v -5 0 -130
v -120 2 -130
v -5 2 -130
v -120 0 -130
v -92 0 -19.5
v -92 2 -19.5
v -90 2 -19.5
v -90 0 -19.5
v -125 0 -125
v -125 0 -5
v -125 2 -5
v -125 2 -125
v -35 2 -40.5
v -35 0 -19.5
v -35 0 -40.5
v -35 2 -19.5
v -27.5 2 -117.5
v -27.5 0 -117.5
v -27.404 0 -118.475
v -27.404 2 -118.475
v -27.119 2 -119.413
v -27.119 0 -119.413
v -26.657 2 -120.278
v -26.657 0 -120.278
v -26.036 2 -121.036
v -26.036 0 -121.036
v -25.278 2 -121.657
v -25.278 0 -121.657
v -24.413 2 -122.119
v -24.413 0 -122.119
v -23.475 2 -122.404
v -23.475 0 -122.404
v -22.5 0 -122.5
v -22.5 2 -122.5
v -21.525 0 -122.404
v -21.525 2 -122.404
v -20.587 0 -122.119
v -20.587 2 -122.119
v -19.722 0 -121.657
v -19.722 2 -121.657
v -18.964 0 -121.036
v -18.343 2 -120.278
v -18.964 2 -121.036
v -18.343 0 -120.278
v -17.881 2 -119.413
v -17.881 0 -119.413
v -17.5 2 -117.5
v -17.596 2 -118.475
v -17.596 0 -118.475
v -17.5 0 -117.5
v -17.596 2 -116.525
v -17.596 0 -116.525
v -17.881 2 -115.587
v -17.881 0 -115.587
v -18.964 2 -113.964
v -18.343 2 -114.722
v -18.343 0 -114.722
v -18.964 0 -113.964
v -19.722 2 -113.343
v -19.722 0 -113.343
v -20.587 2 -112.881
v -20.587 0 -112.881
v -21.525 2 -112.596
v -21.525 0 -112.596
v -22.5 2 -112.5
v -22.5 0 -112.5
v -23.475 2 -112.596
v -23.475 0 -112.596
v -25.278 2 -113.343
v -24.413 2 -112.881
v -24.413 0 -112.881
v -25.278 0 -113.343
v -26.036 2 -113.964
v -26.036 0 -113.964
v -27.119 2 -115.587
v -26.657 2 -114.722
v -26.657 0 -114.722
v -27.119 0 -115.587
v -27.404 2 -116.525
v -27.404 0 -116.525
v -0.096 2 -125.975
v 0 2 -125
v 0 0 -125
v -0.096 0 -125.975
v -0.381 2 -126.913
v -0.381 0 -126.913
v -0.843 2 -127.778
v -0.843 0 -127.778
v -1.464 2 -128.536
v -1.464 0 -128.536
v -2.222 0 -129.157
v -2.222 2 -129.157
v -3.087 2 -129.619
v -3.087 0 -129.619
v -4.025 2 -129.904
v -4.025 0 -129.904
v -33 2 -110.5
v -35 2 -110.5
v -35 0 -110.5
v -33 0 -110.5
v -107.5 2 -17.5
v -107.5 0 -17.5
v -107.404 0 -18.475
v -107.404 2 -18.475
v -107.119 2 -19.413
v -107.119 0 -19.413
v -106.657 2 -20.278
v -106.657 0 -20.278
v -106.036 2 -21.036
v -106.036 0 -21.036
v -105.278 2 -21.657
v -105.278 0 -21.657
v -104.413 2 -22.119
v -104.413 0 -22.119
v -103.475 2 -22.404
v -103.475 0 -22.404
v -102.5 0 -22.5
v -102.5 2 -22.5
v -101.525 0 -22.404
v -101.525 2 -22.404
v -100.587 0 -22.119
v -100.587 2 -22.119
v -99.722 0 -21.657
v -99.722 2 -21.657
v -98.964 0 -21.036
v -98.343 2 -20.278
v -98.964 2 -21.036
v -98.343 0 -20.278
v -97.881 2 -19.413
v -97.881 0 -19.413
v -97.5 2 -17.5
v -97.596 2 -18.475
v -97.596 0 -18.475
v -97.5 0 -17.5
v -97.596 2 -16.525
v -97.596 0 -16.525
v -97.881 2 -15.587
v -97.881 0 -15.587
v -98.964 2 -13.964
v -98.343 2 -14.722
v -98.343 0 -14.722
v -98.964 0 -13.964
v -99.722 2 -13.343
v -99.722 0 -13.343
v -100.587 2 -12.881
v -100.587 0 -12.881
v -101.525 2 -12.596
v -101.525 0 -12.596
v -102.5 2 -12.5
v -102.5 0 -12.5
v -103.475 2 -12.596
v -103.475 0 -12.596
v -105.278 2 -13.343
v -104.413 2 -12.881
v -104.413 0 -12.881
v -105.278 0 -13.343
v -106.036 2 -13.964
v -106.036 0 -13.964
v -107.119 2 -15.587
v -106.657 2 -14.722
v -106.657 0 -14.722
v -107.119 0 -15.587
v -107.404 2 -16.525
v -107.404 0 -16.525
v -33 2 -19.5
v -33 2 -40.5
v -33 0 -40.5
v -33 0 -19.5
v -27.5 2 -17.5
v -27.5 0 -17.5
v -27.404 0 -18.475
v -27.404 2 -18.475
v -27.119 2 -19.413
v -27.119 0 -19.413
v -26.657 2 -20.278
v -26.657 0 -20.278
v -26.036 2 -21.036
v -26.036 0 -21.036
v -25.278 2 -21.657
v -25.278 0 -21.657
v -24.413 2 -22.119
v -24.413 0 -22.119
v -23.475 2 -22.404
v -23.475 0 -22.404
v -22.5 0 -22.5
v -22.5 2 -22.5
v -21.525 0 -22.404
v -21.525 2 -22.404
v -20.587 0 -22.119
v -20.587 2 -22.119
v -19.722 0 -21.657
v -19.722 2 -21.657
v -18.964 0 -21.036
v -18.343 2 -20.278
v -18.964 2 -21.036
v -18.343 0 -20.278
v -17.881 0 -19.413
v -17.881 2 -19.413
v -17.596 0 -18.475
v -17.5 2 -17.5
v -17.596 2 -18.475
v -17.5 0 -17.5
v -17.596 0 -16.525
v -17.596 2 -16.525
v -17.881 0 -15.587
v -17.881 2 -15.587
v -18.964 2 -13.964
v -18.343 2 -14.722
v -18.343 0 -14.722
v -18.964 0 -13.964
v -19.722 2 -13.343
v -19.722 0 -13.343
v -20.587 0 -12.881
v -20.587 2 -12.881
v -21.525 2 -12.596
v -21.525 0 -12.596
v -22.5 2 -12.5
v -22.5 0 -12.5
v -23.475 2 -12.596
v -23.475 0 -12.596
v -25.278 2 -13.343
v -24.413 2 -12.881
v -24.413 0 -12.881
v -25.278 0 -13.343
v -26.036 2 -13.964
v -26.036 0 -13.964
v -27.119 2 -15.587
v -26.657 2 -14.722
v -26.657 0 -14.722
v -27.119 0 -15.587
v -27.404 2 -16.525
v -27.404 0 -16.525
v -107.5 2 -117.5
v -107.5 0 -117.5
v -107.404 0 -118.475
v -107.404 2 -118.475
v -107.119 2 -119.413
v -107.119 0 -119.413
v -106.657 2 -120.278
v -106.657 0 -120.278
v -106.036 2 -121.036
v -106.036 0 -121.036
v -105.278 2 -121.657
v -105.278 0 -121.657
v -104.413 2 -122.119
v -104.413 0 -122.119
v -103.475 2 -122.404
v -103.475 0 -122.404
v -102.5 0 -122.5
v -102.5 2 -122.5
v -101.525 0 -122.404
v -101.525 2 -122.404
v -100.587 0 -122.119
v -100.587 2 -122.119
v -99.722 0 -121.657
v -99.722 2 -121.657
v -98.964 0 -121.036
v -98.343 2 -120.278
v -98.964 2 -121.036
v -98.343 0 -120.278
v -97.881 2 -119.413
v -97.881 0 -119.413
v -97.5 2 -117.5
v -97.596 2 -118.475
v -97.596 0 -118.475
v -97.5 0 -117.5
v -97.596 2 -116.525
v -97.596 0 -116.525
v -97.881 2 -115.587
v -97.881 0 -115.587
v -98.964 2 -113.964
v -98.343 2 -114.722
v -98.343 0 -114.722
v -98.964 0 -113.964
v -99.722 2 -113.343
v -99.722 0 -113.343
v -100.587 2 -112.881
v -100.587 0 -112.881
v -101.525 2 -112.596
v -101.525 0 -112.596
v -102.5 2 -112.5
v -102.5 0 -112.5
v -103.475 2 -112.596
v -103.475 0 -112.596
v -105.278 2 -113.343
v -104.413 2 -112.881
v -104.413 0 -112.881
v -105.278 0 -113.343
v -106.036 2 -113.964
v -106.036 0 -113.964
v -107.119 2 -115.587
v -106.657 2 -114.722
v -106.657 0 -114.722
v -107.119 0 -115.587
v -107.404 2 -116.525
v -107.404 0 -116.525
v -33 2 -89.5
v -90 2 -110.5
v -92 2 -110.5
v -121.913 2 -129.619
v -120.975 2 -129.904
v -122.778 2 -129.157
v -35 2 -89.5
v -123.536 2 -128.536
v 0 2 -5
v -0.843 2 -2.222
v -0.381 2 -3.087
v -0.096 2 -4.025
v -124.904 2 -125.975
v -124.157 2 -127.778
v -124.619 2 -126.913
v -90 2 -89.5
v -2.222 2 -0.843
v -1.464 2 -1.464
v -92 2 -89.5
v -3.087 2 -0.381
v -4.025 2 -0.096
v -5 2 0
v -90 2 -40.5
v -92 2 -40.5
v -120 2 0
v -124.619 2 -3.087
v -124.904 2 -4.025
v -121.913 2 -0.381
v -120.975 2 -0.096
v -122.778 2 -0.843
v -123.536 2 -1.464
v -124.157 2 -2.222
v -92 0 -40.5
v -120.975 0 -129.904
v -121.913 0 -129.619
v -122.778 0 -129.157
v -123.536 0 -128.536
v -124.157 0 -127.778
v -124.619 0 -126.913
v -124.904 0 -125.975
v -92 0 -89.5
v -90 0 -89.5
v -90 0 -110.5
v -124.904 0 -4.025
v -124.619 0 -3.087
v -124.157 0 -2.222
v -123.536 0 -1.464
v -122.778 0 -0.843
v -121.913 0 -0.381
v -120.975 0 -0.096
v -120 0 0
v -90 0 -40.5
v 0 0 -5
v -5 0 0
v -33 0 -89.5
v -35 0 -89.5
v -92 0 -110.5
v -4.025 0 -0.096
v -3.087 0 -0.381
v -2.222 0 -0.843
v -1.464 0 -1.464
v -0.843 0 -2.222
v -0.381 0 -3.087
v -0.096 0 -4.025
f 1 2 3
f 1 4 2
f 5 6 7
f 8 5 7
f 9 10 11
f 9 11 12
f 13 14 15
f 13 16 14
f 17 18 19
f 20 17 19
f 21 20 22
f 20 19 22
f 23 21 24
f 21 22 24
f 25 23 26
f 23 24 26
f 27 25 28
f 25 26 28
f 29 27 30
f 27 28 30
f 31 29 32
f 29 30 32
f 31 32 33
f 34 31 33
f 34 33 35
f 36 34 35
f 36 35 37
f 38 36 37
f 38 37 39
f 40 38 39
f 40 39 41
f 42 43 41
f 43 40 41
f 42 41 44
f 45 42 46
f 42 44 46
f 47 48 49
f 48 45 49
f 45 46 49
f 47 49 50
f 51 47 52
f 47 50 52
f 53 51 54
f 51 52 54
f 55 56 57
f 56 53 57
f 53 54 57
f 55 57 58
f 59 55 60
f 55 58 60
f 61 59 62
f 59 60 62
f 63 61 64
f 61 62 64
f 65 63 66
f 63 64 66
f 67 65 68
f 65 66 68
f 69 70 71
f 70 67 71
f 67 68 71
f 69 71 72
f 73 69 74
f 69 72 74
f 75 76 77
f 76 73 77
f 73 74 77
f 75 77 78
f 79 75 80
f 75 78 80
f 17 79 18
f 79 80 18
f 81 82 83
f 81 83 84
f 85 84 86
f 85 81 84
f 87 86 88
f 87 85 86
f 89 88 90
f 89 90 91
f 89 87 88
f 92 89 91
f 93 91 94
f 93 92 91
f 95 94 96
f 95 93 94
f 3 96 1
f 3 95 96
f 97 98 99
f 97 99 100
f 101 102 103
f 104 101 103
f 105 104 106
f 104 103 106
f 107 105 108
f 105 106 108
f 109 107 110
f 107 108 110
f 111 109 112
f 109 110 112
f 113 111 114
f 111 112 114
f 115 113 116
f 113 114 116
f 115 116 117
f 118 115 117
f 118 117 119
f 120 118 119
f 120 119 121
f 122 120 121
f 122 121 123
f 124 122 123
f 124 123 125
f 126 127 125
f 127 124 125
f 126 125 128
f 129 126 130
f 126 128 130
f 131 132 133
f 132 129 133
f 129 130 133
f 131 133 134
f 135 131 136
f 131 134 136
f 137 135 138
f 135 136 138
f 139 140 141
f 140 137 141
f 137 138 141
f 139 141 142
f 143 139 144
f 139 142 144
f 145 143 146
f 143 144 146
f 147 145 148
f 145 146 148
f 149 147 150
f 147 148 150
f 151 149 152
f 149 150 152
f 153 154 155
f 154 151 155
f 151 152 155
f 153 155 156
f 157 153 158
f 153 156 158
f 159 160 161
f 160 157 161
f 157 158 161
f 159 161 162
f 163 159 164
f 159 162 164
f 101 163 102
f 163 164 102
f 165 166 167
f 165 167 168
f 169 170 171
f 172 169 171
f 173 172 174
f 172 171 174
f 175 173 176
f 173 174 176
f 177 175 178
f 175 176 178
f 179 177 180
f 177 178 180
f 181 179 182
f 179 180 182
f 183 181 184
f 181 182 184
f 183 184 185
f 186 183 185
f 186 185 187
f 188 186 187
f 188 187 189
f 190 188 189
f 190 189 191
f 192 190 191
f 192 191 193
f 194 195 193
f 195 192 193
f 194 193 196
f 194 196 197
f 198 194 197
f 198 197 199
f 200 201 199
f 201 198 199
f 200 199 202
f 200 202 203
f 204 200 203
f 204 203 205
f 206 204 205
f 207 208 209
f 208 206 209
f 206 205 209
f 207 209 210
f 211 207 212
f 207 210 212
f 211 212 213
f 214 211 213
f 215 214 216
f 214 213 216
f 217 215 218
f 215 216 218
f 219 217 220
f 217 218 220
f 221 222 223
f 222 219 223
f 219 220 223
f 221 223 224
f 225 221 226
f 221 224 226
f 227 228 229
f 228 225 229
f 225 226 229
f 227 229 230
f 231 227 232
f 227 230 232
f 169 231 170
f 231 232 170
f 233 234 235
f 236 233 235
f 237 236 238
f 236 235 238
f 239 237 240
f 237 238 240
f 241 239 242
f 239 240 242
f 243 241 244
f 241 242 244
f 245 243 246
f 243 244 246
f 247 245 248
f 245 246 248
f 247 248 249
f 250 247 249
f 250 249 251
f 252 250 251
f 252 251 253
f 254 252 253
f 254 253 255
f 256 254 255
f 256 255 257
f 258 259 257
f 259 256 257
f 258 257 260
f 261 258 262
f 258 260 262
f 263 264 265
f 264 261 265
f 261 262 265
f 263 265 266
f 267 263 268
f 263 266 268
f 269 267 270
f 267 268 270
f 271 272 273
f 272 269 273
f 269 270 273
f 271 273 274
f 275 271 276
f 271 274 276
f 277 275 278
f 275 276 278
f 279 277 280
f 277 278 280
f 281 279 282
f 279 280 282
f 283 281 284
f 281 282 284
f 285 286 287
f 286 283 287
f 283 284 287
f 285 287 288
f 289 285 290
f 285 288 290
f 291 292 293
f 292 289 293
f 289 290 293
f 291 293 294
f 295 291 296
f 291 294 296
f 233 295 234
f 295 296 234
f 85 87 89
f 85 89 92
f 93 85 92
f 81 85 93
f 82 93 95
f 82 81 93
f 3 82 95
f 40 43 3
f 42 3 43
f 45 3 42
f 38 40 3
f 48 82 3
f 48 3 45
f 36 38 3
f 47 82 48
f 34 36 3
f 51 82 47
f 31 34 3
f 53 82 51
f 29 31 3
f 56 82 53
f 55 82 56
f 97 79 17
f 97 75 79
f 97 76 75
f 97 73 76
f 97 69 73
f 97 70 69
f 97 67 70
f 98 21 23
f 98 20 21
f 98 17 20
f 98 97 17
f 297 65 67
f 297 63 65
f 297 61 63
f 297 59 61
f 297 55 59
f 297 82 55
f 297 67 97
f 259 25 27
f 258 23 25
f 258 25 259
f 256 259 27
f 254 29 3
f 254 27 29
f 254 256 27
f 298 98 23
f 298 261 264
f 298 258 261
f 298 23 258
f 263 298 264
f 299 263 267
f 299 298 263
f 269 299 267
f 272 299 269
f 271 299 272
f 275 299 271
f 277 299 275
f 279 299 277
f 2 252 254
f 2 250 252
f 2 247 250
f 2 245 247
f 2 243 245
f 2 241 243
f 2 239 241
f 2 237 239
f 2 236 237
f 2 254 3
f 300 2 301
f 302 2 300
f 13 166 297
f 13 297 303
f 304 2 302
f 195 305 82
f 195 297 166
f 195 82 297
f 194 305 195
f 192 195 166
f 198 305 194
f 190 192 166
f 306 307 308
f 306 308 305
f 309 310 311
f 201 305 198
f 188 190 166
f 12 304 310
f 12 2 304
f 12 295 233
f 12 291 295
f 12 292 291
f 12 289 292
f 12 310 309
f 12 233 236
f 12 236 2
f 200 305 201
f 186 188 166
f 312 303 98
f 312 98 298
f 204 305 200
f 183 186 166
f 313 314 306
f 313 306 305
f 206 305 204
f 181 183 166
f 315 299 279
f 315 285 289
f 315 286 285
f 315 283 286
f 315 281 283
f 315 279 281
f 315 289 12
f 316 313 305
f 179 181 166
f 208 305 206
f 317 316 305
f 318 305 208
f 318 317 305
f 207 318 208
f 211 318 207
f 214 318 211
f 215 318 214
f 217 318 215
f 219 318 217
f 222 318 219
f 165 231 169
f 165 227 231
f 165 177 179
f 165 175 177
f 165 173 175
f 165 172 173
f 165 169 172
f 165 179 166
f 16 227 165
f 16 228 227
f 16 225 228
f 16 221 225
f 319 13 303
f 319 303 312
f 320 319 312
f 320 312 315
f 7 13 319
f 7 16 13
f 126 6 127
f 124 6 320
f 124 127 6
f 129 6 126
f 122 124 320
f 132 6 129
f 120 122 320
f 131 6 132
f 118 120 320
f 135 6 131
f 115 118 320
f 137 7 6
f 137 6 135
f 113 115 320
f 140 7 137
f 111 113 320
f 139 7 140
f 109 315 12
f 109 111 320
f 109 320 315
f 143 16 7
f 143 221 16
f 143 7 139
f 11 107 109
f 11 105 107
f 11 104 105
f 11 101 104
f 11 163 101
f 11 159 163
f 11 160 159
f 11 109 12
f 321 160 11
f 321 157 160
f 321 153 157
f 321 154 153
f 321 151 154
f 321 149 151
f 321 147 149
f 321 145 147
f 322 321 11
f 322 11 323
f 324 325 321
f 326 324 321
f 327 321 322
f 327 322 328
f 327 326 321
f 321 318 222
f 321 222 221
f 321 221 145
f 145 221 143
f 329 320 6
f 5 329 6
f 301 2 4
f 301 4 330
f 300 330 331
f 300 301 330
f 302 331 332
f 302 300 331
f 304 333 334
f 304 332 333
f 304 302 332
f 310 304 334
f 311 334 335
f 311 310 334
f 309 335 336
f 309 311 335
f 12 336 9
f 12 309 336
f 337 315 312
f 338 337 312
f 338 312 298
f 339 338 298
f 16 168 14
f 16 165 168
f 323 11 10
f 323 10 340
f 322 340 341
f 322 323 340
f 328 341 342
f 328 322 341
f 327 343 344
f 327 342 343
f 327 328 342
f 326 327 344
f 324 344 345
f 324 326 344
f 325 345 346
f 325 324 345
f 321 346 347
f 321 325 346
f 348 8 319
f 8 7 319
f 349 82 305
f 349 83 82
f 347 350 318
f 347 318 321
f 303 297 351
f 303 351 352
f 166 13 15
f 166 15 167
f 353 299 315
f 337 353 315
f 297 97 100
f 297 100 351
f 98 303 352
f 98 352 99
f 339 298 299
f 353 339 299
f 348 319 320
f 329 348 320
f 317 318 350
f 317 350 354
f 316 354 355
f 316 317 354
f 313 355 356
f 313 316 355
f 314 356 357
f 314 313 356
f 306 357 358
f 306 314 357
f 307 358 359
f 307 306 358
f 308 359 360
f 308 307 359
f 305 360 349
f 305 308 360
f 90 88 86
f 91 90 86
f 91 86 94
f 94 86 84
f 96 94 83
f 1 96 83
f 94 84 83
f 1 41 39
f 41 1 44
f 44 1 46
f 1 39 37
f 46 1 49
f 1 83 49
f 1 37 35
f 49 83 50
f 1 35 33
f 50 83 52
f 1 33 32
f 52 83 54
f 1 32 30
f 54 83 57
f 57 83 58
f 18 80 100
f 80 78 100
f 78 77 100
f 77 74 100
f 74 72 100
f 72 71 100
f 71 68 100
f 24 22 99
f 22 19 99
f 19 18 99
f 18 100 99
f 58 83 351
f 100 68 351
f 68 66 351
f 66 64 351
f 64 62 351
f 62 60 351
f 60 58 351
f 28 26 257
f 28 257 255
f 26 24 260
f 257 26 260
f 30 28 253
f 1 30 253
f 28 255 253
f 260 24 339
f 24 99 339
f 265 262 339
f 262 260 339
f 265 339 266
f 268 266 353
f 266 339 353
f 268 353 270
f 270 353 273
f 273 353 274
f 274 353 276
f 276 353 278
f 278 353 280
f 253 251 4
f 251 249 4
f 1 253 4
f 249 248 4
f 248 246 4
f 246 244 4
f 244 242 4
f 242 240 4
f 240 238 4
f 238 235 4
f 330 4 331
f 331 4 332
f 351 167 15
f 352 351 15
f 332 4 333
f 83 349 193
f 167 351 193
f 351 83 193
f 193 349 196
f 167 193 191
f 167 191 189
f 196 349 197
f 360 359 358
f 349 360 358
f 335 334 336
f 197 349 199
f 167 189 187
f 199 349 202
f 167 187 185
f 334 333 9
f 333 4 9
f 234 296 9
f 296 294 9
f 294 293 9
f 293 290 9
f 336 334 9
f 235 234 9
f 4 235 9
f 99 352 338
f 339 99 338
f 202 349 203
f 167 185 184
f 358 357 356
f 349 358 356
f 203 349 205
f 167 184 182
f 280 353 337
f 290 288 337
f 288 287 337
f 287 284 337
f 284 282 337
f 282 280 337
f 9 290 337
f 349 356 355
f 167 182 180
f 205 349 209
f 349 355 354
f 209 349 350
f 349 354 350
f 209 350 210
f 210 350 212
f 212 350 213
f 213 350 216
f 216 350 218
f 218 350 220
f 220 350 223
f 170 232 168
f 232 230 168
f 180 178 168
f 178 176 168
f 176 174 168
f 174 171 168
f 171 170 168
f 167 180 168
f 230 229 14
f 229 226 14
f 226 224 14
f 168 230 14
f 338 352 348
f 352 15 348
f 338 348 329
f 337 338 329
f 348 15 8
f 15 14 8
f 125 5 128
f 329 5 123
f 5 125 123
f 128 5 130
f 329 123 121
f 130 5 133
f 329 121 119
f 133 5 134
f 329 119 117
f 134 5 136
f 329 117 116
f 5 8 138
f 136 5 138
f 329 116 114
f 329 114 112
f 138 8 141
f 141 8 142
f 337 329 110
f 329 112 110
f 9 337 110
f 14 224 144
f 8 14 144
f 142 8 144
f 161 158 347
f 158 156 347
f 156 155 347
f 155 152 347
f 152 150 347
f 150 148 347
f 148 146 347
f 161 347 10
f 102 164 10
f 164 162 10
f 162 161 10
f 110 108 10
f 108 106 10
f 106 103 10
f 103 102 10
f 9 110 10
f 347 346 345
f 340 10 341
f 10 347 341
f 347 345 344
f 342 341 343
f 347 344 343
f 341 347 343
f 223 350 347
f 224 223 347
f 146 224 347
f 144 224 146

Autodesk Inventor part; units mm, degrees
ref_plane "YZ Plane" through (0, 0, 0) normal (1, 0, 0) x (0, 1, 0)
ref_plane "XZ Plane" through (0, 0, 0) normal (0, 1, 0) x (-1, 0, 0)
ref_plane "XY Plane" through (0, 0, 0) normal (0, 0, 1) x (1, 0, 0)
sketch "Sketch1" plane through (0, 0, 0) normal (0, 1, 0) x (-1, 0, 0)
  line L0 (0, 0) -> (125, 0)
  line L1 (125, 0) -> (125, -130)
  line L2 (125, -130) -> (0, -130)
  line L3 (0, -130) -> (0, 0)
  circle A0 centre (102.5, -17.5) radius 5
  circle A1 centre (102.5, -117.5) radius 5
  circle A2 centre (22.5, -17.5) radius 5
  circle A3 centre (22.5, -117.5) radius 5
  dimension "d0" = 130
  dimension "d1" = 125
  dimension "d2" = 10
  dimension "d3" = 10
  dimension "d4" = 100
  dimension "d5" = 10
  dimension "d6" = 10
  dimension "d7" = 100
  dimension "d8" = 80
  dimension "d9" = 80
  dimension "d10" = 17.5
  dimension "d11" = 22.5
  dimension "d12" = 17.5
  dimension "d13" = 22.5
extrude "Extrusion1" add sketch "Sketch1" along normal blind 2
sketch "Sketch2" plane through (0, 2, 0) normal (0, 1, 0) x (1, 0, 0)
  line L0 (-90, 115.6784) -> (-35, 115.6784) construction
  line L1 (-35, 115.6784) -> (-35, 15.6784) construction
  line L2 (-35, 15.6784) -> (-90, 15.6784) construction
  line L3 (-90, 15.6784) -> (-90, 115.6784) construction
  line L4 (0, 130) -> (-125, 130) projected
  line L5 (-125, 130) -> (-125, 0) projected
  line L6 (-125, 0) -> (0, 0) projected
  line L7 (0, 0) -> (0, 130) projected
  circle A0 centre (-22.5, 117.5) radius 5 projected
  circle A1 centre (-22.5, 17.5) radius 5 projected
  circle A2 centre (-102.5, 117.5) radius 5 projected
  circle A3 centre (-102.5, 17.5) radius 5 projected
  line L8 (-35, 40.5) -> (-33, 40.5)
  line L9 (-33, 40.5) -> (-33, 19.5)
  line L10 (-33, 19.5) -> (-35, 19.5)
  line L11 (-35, 19.5) -> (-35, 40.5)
  line L12 (-35, 110.5) -> (-33, 110.5)
  line L13 (-33, 110.5) -> (-33, 89.5)
  line L14 (-33, 89.5) -> (-35, 89.5)
  line L15 (-35, 89.5) -> (-35, 110.5)
  line L16 (-90, 110.5) -> (-92, 110.5)
  line L17 (-92, 110.5) -> (-92, 89.5)
  line L18 (-92, 89.5) -> (-90, 89.5)
  line L19 (-90, 89.5) -> (-90, 110.5)
  line L20 (-90, 40.5) -> (-92, 40.5)
  line L21 (-92, 40.5) -> (-92, 19.5)
  line L22 (-92, 19.5) -> (-90, 19.5)
  line L23 (-90, 19.5) -> (-90, 40.5)
  dimension "d16" = 55
  dimension "d17" = 100
  dimension "d18" = 125
  dimension "d19" = 35
  dimension "d20" = 2
  dimension "d21" = 2
  dimension "d22" = 2
  dimension "d23" = 2
  dimension "d24" = 21
  dimension "d25" = 21
  dimension "d26" = 21
  dimension "d27" = 21
  dimension "d28" = 19.5
  dimension "d29" = 19.5
  dimension "d30" = 19.5
  dimension "d31" = 19.5
extrude "Extrusion2" cut sketch "Sketch2" against normal through all contours L8 L9 L10 L11 | L12 L13 L14 L15 | L19 L18 L17 L16 | L23 L22 L21 L20
fillet "Fillet1" radius 5 4 edges at (0, 1, 0) (0, 1, -130) (-125, 1, 0) (-125, 1, -130)
equation "\"d19\" = -0.5 * d16 + 0.5 * d18"
equation "\"d25\" = d24"
equation "\"d26\" = d27"
equation "\"d27\" = d25"
equation "\"d29\" = d28"
equation "\"d30\" = d29"
equation "\"d31\" = d28"
properties part number "plade_til_beslag"
